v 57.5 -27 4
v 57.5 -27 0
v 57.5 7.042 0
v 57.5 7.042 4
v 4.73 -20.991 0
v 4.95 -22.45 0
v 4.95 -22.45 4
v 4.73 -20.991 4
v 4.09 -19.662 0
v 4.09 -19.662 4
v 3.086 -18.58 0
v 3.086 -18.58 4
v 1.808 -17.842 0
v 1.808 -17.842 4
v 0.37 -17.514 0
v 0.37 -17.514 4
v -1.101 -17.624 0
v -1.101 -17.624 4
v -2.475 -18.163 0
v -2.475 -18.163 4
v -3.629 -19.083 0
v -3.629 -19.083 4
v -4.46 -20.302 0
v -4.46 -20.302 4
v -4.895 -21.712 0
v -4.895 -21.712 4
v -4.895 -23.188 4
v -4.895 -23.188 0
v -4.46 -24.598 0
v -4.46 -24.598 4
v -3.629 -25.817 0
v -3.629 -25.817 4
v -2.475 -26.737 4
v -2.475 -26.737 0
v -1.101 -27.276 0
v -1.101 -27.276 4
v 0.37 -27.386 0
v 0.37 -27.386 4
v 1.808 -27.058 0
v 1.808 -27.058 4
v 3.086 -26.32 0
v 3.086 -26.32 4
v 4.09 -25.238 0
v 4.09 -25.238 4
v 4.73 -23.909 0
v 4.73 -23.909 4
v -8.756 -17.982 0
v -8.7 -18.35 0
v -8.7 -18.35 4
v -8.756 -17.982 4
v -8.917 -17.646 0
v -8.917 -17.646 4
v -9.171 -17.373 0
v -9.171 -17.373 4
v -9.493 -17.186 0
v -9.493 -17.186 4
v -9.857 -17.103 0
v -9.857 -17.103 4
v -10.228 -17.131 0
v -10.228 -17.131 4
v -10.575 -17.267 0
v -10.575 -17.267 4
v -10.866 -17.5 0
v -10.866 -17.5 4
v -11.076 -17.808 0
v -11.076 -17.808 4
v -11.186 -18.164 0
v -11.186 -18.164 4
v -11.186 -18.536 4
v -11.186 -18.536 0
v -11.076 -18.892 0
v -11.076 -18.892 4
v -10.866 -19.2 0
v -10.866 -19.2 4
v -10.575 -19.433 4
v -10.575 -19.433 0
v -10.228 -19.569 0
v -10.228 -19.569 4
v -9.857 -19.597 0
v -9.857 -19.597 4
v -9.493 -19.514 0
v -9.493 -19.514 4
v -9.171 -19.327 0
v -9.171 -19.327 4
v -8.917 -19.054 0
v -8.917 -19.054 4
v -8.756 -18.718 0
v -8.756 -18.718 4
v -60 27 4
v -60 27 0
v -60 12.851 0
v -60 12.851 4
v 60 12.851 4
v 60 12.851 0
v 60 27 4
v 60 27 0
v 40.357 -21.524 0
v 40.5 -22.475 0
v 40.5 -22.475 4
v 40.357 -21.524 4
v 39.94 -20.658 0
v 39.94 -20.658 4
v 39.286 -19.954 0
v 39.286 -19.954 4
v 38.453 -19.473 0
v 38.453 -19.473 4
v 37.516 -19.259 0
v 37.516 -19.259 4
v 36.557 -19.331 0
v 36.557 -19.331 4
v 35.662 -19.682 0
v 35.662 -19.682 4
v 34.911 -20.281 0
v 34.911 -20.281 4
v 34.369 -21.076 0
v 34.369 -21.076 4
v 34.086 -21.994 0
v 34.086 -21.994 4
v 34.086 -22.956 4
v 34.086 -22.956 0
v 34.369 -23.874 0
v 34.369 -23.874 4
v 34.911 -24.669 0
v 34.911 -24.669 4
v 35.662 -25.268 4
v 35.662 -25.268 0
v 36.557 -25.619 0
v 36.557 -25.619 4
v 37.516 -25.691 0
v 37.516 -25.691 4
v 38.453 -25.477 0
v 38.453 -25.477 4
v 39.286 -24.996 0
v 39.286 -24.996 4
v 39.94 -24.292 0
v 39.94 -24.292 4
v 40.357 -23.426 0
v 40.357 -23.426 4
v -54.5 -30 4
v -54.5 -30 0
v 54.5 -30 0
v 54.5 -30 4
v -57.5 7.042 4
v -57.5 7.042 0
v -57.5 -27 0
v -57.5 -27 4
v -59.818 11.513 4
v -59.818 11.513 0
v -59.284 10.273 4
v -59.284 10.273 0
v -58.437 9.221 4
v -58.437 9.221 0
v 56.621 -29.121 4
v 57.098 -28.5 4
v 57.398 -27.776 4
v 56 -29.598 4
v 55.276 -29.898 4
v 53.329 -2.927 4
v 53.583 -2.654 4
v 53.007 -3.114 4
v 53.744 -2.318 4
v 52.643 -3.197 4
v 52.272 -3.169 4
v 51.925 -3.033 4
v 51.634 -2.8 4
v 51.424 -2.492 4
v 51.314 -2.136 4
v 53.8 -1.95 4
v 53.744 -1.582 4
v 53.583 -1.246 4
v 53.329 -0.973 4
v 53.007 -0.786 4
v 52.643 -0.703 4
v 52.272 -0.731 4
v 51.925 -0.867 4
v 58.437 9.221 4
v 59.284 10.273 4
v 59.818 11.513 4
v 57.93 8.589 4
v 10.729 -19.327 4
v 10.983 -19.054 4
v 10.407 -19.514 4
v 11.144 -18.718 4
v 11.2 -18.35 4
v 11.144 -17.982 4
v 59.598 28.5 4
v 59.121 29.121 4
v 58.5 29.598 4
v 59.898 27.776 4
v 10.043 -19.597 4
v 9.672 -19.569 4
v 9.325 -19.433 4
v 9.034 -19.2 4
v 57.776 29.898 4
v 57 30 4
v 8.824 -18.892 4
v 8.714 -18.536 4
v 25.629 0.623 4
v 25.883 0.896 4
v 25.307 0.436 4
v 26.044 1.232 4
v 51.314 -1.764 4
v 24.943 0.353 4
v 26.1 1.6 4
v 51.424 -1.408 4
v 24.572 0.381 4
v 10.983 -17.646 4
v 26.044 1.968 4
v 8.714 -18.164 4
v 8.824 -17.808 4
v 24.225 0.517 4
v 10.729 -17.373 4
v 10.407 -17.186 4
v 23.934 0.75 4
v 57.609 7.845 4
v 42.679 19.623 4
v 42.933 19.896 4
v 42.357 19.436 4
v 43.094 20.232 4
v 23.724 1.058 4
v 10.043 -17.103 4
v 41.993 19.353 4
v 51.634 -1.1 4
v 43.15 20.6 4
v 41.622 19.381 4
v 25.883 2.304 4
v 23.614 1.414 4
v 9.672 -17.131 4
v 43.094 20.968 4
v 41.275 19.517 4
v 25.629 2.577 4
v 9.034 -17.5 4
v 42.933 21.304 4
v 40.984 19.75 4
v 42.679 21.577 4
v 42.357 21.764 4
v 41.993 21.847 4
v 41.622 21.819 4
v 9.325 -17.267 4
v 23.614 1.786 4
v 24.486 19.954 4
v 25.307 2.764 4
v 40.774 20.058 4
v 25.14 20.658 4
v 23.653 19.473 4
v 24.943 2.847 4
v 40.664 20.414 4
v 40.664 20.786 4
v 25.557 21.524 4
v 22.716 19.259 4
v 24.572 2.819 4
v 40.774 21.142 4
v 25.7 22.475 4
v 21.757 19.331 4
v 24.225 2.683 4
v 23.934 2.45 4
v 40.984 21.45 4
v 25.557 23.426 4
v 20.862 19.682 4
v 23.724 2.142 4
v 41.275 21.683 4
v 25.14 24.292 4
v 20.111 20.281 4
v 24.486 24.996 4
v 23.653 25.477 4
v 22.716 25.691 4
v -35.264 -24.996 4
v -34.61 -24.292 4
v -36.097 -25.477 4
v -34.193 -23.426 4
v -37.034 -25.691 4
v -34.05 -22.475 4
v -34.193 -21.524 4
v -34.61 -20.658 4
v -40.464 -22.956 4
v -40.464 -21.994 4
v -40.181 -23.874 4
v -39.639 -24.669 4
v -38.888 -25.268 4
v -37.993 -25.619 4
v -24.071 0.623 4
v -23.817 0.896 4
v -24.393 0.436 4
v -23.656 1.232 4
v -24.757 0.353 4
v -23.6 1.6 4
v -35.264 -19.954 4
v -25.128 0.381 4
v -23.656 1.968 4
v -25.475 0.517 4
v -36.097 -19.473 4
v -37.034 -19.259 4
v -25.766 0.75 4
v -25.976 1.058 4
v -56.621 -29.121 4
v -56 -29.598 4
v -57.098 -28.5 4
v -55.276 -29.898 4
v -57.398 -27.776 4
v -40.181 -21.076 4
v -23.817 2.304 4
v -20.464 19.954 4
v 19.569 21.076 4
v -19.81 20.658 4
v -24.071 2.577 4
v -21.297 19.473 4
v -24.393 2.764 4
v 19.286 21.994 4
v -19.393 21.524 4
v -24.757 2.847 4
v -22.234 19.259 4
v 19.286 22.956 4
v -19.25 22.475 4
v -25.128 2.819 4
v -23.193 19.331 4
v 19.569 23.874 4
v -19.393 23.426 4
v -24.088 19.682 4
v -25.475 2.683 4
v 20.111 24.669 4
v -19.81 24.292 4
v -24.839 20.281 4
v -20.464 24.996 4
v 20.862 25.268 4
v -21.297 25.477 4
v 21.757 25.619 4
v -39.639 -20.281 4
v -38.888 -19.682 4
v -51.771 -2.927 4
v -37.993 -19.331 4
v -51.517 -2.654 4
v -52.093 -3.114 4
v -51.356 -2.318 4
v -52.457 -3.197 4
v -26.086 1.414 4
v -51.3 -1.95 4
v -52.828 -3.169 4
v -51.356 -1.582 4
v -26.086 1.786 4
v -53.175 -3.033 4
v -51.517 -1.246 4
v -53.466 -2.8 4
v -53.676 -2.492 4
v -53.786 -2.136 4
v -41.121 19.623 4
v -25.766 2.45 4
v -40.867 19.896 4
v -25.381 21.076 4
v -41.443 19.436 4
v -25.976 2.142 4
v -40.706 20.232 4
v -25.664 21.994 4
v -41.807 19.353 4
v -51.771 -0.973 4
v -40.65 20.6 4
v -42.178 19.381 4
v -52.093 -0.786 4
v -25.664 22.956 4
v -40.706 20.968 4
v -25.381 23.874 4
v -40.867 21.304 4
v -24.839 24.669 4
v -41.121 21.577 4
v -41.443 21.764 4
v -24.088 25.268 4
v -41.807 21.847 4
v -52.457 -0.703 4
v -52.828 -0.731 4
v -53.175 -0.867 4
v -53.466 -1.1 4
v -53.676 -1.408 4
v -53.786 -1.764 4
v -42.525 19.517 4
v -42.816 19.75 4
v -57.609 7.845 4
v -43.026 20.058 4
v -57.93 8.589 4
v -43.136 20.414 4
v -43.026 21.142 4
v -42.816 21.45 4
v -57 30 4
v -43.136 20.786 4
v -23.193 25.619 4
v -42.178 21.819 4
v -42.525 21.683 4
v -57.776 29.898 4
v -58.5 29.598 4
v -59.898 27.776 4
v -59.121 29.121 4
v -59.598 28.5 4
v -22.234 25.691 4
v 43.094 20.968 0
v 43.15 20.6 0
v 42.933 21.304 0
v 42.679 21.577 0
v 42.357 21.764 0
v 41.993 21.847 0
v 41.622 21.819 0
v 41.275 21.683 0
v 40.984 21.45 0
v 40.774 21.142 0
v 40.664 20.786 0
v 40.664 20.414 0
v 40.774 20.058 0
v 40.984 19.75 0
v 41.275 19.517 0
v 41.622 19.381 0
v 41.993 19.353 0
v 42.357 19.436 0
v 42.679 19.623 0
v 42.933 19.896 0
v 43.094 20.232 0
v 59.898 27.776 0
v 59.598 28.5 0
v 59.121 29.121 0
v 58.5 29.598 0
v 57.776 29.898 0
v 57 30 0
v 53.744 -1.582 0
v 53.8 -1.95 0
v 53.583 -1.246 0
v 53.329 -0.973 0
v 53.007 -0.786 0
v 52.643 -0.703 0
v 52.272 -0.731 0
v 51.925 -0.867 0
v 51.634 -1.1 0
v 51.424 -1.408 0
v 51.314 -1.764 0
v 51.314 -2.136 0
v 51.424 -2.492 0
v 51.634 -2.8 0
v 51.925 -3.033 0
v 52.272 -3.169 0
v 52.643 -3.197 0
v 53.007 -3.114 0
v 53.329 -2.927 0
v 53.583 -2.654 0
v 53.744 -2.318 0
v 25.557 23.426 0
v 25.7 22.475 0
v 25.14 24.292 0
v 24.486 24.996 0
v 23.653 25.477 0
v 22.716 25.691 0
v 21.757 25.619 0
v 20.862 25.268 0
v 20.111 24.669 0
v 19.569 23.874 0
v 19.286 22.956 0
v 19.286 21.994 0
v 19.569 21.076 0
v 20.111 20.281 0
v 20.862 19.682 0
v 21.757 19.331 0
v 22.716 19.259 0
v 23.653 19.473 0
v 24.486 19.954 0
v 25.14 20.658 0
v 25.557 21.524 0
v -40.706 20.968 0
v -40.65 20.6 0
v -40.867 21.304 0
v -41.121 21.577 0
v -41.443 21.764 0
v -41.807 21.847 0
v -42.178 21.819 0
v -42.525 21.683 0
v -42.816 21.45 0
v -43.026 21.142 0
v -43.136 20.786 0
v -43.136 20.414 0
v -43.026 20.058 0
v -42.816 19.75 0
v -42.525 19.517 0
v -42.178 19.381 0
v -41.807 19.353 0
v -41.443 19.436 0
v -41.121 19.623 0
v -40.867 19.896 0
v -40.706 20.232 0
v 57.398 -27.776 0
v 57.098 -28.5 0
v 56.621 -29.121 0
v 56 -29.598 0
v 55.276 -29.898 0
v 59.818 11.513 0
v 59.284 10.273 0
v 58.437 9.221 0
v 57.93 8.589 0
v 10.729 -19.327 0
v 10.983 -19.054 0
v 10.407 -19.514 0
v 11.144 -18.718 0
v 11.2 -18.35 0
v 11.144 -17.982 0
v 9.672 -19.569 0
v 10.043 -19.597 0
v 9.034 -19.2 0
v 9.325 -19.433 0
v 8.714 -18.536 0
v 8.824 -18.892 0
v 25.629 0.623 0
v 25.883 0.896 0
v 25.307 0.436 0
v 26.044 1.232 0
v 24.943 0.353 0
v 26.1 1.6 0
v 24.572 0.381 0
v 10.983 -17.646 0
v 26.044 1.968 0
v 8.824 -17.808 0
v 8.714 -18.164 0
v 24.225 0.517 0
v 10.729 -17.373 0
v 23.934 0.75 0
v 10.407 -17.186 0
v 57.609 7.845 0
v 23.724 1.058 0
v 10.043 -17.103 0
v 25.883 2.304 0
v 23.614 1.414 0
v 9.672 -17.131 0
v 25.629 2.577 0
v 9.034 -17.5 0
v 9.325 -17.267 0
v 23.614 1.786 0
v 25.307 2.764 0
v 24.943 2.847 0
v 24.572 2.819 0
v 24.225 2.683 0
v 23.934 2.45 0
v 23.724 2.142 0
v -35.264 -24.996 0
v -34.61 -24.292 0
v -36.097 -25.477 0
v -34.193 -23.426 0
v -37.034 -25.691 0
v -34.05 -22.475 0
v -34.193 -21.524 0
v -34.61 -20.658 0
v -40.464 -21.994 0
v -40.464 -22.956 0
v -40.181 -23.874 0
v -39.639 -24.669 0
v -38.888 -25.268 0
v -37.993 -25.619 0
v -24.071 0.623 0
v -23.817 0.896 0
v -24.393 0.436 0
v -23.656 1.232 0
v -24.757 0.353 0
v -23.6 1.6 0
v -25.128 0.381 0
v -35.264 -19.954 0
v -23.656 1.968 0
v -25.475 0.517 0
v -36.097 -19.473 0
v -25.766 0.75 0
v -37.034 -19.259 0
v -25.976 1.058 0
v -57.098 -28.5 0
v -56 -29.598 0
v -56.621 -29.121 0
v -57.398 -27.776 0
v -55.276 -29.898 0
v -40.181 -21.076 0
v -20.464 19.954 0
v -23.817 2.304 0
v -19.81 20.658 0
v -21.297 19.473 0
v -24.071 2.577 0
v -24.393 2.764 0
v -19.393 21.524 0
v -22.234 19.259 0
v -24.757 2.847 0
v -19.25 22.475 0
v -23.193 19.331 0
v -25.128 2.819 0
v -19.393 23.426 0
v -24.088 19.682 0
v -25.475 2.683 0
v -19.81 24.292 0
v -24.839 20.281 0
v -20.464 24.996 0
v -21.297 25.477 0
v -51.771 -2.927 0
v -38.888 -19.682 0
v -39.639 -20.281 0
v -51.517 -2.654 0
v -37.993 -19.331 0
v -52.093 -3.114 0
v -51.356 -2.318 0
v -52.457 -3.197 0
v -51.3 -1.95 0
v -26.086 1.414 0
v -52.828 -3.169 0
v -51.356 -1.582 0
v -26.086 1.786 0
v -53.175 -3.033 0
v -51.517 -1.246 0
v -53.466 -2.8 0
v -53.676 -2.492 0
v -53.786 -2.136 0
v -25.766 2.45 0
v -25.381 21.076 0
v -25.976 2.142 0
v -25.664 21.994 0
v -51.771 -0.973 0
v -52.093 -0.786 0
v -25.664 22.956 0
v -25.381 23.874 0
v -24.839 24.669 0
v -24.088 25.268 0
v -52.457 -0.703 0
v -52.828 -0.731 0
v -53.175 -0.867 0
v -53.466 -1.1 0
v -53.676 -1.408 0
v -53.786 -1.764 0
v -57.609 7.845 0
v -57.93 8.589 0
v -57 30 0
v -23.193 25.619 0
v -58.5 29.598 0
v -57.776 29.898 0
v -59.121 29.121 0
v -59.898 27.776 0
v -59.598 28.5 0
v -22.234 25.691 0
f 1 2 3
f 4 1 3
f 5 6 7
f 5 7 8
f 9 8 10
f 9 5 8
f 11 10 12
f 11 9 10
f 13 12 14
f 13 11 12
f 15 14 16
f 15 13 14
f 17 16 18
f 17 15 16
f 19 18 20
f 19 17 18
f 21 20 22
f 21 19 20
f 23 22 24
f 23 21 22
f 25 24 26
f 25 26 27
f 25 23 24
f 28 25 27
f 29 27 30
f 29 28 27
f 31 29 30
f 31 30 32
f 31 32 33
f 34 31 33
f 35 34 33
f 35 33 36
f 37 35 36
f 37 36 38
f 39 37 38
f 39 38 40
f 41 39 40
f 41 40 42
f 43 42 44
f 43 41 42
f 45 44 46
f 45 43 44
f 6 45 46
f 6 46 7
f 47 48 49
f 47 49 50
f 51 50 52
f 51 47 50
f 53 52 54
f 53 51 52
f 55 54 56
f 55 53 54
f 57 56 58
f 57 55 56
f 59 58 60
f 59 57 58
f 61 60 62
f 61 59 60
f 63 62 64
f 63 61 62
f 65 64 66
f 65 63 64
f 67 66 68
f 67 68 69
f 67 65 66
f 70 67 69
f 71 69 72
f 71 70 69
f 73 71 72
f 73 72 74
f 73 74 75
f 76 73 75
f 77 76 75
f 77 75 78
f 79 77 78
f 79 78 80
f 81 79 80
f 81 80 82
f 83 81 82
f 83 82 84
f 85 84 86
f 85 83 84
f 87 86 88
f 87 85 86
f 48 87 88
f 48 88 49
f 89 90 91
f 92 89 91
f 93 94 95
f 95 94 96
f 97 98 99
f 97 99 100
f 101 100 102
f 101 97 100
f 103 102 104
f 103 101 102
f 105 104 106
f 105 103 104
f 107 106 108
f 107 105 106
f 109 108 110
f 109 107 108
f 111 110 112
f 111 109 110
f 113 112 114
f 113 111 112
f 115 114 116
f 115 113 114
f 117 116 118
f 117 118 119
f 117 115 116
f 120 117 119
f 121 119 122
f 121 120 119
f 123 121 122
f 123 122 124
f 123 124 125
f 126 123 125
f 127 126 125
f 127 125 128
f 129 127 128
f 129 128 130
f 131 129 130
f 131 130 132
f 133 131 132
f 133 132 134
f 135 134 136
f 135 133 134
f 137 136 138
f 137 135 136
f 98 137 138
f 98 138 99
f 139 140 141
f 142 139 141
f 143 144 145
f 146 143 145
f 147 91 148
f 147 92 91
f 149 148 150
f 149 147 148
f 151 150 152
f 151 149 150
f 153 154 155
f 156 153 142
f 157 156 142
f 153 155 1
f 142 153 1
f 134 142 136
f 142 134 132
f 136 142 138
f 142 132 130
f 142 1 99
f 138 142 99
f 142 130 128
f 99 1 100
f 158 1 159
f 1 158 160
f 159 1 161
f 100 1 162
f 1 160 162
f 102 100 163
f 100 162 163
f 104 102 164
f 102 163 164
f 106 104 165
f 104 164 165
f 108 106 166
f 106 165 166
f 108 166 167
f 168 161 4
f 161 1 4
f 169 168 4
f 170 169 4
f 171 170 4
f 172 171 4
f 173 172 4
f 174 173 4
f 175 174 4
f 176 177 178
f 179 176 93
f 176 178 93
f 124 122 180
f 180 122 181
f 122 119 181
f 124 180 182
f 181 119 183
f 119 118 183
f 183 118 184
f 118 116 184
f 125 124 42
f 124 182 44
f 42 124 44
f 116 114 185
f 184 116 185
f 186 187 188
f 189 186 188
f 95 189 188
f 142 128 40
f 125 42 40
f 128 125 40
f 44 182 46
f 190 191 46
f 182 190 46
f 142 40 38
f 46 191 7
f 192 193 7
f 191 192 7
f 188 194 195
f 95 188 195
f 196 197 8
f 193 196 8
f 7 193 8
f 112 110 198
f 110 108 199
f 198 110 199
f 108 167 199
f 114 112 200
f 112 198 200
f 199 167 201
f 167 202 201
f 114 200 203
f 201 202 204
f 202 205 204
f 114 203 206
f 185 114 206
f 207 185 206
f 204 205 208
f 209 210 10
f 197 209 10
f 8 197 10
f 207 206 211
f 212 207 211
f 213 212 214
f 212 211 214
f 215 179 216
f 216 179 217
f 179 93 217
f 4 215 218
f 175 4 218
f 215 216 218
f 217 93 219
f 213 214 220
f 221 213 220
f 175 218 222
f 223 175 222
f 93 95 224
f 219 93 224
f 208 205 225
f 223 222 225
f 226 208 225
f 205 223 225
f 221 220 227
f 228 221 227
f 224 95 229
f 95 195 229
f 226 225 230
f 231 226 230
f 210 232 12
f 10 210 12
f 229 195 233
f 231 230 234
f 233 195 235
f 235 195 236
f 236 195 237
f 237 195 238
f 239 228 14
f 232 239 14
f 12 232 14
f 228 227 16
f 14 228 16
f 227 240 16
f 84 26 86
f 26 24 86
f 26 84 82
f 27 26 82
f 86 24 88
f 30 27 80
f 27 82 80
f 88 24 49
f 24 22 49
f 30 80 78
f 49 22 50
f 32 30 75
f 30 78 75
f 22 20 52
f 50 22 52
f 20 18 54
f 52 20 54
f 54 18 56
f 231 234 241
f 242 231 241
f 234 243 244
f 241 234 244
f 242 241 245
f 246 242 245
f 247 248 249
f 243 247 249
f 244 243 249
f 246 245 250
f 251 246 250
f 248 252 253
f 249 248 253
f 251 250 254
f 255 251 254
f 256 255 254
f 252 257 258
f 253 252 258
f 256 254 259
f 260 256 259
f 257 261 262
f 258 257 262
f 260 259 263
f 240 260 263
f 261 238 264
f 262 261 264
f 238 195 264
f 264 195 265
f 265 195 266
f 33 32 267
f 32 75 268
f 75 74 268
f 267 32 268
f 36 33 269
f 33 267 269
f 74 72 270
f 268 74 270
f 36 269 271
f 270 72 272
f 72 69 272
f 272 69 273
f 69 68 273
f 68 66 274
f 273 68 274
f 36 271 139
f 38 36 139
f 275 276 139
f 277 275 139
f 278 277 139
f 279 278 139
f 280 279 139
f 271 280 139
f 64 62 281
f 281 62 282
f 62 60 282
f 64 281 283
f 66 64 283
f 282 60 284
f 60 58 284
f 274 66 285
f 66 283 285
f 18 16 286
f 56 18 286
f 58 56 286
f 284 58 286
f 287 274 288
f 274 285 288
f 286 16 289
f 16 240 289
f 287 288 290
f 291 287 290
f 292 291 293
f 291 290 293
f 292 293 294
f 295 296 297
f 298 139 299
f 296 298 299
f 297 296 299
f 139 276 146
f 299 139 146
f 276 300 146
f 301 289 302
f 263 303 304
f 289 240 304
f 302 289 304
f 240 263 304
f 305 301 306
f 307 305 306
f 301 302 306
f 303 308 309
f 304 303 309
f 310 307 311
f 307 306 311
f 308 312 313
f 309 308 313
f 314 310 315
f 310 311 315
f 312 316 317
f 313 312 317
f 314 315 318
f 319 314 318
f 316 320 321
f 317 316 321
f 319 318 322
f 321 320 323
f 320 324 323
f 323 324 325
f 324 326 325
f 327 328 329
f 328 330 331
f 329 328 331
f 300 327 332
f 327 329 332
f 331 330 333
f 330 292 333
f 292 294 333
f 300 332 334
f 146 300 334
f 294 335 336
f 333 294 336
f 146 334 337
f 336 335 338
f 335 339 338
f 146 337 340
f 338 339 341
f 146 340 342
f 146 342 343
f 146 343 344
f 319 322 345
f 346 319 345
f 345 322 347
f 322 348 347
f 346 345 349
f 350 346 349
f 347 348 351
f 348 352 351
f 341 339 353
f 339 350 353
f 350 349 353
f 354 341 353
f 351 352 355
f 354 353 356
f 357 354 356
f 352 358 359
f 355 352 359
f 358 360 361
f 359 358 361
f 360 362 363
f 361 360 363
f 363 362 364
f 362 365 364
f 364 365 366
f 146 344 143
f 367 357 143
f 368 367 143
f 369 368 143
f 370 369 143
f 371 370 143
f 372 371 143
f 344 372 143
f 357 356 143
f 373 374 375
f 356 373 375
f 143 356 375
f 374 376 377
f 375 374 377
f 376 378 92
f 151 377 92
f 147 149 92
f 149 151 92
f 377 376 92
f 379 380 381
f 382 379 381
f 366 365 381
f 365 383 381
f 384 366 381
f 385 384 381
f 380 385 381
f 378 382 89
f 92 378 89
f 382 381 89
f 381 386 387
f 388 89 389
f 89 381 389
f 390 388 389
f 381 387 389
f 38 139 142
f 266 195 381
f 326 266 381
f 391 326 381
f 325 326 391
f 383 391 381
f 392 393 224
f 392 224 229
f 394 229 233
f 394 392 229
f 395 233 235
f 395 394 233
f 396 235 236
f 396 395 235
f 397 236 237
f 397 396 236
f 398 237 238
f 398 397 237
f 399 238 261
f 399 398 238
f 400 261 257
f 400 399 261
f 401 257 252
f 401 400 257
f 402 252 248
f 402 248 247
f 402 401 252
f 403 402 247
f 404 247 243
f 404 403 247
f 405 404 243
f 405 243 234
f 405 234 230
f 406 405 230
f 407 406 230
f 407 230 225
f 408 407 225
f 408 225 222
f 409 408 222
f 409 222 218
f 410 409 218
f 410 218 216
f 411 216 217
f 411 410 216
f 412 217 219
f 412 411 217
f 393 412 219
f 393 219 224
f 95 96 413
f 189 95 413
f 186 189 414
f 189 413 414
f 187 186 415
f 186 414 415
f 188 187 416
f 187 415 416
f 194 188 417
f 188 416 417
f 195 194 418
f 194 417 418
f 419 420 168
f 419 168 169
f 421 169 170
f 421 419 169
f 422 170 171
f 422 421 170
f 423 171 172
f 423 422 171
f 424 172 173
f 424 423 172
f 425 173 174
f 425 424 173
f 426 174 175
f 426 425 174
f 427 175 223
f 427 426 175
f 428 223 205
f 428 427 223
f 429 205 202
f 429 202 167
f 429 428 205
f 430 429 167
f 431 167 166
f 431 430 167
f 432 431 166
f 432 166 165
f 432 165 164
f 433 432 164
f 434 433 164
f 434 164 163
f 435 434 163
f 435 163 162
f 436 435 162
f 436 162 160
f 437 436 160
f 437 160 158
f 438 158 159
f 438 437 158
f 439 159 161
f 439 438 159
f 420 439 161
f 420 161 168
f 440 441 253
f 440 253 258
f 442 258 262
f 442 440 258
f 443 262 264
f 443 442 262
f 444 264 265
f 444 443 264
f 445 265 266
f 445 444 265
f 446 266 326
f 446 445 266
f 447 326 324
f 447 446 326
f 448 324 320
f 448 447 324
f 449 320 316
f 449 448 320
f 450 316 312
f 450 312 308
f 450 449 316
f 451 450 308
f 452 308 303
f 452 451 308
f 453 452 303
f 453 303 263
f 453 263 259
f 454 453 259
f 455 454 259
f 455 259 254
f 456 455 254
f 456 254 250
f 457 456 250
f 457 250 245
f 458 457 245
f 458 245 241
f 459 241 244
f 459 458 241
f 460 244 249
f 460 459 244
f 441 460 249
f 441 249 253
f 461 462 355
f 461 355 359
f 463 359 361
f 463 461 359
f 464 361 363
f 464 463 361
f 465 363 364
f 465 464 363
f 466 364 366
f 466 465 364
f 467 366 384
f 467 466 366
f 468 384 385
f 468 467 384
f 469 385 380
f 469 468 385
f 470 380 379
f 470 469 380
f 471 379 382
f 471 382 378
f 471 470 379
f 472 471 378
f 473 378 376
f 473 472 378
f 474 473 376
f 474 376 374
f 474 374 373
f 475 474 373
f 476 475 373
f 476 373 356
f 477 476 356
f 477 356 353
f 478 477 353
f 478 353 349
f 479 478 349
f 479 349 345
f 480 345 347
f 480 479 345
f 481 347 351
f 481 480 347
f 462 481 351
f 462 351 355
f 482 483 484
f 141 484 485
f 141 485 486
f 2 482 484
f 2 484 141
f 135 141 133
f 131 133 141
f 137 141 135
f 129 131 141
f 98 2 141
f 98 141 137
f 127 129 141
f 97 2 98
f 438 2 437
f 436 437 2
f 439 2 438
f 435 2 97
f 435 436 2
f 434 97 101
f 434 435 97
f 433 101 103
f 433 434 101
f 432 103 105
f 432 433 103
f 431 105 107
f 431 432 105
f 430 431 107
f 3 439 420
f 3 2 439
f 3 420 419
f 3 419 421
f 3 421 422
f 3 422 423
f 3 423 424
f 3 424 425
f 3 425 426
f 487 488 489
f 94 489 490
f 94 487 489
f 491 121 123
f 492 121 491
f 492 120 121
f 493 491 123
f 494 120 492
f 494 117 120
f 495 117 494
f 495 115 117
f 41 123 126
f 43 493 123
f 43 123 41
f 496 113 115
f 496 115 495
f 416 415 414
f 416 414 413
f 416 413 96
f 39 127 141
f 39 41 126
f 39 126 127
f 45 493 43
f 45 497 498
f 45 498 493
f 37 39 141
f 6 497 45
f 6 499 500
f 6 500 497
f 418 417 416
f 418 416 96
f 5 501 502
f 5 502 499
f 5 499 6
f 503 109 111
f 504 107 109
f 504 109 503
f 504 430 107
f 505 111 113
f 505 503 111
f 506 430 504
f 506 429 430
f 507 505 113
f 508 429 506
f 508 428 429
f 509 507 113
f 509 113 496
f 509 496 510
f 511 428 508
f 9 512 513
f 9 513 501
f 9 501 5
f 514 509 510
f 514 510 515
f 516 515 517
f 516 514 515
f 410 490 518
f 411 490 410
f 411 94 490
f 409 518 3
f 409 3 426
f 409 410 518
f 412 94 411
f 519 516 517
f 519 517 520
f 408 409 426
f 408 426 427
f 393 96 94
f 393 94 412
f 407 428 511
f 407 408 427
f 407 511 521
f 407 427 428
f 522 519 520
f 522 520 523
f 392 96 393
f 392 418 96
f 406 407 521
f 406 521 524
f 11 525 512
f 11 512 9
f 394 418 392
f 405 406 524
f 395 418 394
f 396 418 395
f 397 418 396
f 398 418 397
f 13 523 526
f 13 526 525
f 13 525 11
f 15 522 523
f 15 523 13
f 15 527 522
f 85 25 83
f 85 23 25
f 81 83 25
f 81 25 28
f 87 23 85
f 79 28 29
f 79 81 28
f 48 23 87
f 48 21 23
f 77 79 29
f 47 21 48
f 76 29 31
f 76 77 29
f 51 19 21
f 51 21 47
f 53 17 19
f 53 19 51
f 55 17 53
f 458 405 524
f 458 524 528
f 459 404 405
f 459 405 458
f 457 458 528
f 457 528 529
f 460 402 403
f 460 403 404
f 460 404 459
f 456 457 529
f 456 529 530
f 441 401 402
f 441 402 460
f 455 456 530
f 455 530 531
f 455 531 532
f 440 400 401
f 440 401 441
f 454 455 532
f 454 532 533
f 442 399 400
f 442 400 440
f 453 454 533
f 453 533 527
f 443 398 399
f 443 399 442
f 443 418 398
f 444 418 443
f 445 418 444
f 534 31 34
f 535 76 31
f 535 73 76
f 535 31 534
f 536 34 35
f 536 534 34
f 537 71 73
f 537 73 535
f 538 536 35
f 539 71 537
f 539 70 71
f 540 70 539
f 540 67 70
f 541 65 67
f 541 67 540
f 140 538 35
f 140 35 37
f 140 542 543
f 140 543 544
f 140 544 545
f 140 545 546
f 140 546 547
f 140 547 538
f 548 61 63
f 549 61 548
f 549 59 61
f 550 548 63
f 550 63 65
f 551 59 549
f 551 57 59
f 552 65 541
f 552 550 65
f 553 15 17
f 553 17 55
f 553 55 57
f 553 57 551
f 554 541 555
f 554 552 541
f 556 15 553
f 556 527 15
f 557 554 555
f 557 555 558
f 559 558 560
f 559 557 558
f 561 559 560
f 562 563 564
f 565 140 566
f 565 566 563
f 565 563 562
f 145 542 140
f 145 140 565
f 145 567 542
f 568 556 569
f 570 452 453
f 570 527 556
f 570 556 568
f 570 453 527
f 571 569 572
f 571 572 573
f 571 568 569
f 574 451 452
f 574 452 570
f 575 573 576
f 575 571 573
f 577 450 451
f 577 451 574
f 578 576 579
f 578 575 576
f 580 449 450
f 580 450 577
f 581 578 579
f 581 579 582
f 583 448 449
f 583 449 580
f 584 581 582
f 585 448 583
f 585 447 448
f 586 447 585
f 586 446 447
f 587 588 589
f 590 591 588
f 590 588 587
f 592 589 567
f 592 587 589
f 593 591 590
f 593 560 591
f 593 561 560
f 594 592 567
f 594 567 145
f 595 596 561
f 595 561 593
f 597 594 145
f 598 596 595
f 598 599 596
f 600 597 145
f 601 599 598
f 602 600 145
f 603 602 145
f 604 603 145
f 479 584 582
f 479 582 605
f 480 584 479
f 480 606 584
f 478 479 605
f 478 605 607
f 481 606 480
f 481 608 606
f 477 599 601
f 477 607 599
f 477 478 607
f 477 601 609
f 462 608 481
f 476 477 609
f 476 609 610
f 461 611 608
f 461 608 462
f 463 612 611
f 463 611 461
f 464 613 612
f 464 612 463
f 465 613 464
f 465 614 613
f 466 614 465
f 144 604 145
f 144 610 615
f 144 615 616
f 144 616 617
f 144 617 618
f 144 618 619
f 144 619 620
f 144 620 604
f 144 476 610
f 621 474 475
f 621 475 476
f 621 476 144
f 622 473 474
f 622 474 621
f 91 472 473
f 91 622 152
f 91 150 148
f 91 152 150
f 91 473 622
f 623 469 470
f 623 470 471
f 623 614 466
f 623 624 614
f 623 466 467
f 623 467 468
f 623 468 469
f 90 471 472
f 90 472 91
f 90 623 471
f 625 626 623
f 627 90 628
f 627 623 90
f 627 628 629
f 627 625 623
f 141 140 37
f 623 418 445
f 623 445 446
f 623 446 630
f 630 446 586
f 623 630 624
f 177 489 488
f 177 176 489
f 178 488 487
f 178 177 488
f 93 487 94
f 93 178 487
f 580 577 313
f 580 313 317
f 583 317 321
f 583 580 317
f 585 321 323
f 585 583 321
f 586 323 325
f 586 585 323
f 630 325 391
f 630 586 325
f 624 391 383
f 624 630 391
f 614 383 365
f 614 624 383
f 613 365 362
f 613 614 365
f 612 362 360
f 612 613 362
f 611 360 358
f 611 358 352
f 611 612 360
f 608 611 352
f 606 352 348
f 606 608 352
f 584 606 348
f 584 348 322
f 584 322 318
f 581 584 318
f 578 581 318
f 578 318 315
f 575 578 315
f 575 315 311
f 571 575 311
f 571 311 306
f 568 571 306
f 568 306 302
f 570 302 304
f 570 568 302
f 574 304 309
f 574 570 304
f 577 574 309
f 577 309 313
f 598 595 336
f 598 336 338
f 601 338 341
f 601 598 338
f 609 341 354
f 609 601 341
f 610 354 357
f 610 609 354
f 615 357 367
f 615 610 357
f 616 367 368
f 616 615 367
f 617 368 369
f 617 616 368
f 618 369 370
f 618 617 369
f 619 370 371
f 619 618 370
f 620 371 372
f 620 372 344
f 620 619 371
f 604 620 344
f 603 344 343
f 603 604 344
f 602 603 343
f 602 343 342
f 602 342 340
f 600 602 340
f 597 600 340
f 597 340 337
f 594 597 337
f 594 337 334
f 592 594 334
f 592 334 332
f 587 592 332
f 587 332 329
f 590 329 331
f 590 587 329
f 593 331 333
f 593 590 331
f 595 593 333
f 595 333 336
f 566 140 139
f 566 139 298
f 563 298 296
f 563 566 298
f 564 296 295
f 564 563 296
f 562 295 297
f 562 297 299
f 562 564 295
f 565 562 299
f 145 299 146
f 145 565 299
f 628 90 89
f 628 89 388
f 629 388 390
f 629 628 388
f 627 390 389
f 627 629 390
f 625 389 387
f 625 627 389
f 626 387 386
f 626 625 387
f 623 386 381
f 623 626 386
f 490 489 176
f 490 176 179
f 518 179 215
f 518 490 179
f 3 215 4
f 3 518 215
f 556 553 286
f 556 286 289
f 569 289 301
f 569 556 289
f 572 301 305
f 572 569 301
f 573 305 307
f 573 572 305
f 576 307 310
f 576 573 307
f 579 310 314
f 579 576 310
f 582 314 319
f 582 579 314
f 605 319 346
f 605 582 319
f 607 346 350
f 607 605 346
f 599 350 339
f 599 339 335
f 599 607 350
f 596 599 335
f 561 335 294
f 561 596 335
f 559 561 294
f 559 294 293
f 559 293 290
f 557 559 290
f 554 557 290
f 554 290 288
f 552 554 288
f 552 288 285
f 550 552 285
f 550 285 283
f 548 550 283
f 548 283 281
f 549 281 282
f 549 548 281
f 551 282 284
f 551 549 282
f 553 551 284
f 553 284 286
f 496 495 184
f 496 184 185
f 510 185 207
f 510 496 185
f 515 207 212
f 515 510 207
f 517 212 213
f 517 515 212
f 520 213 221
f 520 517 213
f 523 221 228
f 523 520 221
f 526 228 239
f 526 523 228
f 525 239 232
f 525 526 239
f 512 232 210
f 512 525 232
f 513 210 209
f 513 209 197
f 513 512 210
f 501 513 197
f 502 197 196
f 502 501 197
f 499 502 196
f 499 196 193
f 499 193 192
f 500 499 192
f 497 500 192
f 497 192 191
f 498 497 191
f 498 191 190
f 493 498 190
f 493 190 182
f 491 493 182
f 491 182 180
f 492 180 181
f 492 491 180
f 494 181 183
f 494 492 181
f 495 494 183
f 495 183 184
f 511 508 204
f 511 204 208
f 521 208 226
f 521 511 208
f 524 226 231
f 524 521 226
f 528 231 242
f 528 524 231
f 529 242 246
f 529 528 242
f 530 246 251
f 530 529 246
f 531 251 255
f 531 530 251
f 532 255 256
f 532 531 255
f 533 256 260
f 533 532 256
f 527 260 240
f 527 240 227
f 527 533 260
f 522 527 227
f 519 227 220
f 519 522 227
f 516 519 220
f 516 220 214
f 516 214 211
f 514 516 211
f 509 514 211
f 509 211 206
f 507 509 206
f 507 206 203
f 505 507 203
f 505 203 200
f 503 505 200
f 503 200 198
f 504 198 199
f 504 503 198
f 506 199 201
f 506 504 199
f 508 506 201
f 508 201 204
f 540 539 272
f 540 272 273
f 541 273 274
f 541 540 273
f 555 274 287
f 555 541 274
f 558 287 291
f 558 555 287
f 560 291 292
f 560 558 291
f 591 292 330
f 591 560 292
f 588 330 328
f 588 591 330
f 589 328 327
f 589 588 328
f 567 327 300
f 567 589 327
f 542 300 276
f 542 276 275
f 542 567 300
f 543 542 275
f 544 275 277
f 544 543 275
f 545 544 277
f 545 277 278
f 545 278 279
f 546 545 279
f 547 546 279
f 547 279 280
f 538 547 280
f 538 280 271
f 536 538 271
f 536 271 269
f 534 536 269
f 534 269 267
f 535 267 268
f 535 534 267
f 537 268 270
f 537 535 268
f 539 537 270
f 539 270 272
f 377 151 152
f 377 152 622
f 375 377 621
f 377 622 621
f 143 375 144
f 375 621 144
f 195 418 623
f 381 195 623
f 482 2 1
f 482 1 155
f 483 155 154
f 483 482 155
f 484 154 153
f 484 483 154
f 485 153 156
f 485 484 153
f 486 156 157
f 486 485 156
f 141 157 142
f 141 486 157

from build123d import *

# Parameters (mm, degrees)
F0_R         = 3.225
F0_R_2       = 1.25
F0_R_3       = 4.95
F1_DEPTH     = 4
F2_T1_DEPTH  = 4
F2_T3_DEPTH  = 4
F2_T5_DEPTH  = 19
F2_T7_DEPTH  = 19
F2_T9_DEPTH  = 19
F2_T11_DEPTH = 19
F3_R         = 5


# Not quite as in the source:
# - a fillet or chamfer that OpenCascade refuses, or shapes differently, is made with other operations: its cross-section is extruded or revolved along the edge and cut away or added


with BuildPart() as f1:
    # F0 (on Top) → F1 (new body)
    with BuildSketch(Plane.XY):
        Polygon((60, 10), (60, 30), (-60, 30), (-60, 10), (-57.5, 10), (-57.5, -30), (57.5, -30), (57.5, 10), align=None)
        with Locations((-37.275, -22.475)):
            Circle(F0_R, mode=Mode.SUBTRACT)
        with Locations((-9.95, -18.35)):
            Circle(F0_R_2, mode=Mode.SUBTRACT)
        with Locations((-52.55, -1.95)):
            Circle(F0_R_2, mode=Mode.SUBTRACT)
        with Locations((0, -22.45)):
            Circle(F0_R_3, mode=Mode.SUBTRACT)
        with Locations((9.95, -18.35)):
            Circle(F0_R_2, mode=Mode.SUBTRACT)
        with Locations((37.275, -22.475)):
            Circle(F0_R, mode=Mode.SUBTRACT)
        with Locations((52.55, -1.95)):
            Circle(F0_R_2, mode=Mode.SUBTRACT)
        with Locations((-24.85, 1.6)):
            Circle(F0_R_2, mode=Mode.SUBTRACT)
        with Locations((-41.9, 20.6)):
            Circle(F0_R_2, mode=Mode.SUBTRACT)
        with Locations((-22.475, 22.475)):
            Circle(F0_R, mode=Mode.SUBTRACT)
        with Locations((24.85, 1.6)):
            Circle(F0_R_2, mode=Mode.SUBTRACT)
        with Locations((22.475, 22.475)):
            Circle(F0_R, mode=Mode.SUBTRACT)
        with Locations((41.9, 20.6)):
            Circle(F0_R_2, mode=Mode.SUBTRACT)
    extrude(amount=F1_DEPTH)

    # F2: fillet of radius 3 on 6 edges, made by hand

    # F2_s2 → F2_t1 (join)
    with BuildSketch(Plane.XY):
        with BuildLine():
            ThreePointArc((-60, 10), (-58.2087121525, 8.9784517816), (-57.5, 7.0419601084))
            Line((-57.5, 7.0419601084), (-57.5, 10))
            Line((-57.5, 10), (-60, 10))
        make_face()
    extrude(amount=F2_T1_DEPTH)

    # F2_s4 → F2_t3 (join)
    with BuildSketch(Plane.XY):
        with BuildLine():
            ThreePointArc((60, 10), (58.2087121525, 8.9784517816), (57.5, 7.0419601084))
            Line((57.5, 7.0419601084), (57.5, 10))
            Line((57.5, 10), (60, 10))
        make_face()
    extrude(amount=F2_T3_DEPTH)

    # F2_s6 → F2_t5 (cut)
    with BuildSketch(Plane.XY.offset(-7.5)):
        with BuildLine():
            ThreePointArc((60, 27), (59.1213203436, 29.1213203436), (57, 30))
            Line((57, 30), (60, 30))
            Line((60, 30), (60, 27))
        make_face()
    extrude(amount=F2_T5_DEPTH, mode=Mode.SUBTRACT)

    # F2_s8 → F2_t7 (cut)
    with BuildSketch(Plane.XY.offset(-7.5)):
        with BuildLine():
            ThreePointArc((-60, 27), (-59.1213203436, 29.1213203436), (-57, 30))
            Line((-57, 30), (-60, 30))
            Line((-60, 30), (-60, 27))
        make_face()
    extrude(amount=F2_T7_DEPTH, mode=Mode.SUBTRACT)

    # F2_s10 → F2_t9 (cut)
    with BuildSketch(Plane.XY.offset(-7.5)):
        with BuildLine():
            ThreePointArc((-54.5, -30), (-56.6213203436, -29.1213203436), (-57.5, -27))
            Line((-57.5, -27), (-57.5, -30))
            Line((-57.5, -30), (-54.5, -30))
        make_face()
    extrude(amount=F2_T9_DEPTH, mode=Mode.SUBTRACT)

    # F2_s12 → F2_t11 (cut)
    with BuildSketch(Plane.XY.offset(-7.5)):
        with BuildLine():
            ThreePointArc((57.5, -27), (56.6213203436, -29.1213203436), (54.5, -30))
            Line((54.5, -30), (57.5, -30))
            Line((57.5, -30), (57.5, -27))
        make_face()
    extrude(amount=F2_T11_DEPTH, mode=Mode.SUBTRACT)

    # F3
    f3_edges = [f1.edges().sort_by_distance(p)[0] for p in [
        (-60, 10, 2),
        (60, 10, 2),
    ]]
    fillet(f3_edges, radius=F3_R)


solid = f1.part
